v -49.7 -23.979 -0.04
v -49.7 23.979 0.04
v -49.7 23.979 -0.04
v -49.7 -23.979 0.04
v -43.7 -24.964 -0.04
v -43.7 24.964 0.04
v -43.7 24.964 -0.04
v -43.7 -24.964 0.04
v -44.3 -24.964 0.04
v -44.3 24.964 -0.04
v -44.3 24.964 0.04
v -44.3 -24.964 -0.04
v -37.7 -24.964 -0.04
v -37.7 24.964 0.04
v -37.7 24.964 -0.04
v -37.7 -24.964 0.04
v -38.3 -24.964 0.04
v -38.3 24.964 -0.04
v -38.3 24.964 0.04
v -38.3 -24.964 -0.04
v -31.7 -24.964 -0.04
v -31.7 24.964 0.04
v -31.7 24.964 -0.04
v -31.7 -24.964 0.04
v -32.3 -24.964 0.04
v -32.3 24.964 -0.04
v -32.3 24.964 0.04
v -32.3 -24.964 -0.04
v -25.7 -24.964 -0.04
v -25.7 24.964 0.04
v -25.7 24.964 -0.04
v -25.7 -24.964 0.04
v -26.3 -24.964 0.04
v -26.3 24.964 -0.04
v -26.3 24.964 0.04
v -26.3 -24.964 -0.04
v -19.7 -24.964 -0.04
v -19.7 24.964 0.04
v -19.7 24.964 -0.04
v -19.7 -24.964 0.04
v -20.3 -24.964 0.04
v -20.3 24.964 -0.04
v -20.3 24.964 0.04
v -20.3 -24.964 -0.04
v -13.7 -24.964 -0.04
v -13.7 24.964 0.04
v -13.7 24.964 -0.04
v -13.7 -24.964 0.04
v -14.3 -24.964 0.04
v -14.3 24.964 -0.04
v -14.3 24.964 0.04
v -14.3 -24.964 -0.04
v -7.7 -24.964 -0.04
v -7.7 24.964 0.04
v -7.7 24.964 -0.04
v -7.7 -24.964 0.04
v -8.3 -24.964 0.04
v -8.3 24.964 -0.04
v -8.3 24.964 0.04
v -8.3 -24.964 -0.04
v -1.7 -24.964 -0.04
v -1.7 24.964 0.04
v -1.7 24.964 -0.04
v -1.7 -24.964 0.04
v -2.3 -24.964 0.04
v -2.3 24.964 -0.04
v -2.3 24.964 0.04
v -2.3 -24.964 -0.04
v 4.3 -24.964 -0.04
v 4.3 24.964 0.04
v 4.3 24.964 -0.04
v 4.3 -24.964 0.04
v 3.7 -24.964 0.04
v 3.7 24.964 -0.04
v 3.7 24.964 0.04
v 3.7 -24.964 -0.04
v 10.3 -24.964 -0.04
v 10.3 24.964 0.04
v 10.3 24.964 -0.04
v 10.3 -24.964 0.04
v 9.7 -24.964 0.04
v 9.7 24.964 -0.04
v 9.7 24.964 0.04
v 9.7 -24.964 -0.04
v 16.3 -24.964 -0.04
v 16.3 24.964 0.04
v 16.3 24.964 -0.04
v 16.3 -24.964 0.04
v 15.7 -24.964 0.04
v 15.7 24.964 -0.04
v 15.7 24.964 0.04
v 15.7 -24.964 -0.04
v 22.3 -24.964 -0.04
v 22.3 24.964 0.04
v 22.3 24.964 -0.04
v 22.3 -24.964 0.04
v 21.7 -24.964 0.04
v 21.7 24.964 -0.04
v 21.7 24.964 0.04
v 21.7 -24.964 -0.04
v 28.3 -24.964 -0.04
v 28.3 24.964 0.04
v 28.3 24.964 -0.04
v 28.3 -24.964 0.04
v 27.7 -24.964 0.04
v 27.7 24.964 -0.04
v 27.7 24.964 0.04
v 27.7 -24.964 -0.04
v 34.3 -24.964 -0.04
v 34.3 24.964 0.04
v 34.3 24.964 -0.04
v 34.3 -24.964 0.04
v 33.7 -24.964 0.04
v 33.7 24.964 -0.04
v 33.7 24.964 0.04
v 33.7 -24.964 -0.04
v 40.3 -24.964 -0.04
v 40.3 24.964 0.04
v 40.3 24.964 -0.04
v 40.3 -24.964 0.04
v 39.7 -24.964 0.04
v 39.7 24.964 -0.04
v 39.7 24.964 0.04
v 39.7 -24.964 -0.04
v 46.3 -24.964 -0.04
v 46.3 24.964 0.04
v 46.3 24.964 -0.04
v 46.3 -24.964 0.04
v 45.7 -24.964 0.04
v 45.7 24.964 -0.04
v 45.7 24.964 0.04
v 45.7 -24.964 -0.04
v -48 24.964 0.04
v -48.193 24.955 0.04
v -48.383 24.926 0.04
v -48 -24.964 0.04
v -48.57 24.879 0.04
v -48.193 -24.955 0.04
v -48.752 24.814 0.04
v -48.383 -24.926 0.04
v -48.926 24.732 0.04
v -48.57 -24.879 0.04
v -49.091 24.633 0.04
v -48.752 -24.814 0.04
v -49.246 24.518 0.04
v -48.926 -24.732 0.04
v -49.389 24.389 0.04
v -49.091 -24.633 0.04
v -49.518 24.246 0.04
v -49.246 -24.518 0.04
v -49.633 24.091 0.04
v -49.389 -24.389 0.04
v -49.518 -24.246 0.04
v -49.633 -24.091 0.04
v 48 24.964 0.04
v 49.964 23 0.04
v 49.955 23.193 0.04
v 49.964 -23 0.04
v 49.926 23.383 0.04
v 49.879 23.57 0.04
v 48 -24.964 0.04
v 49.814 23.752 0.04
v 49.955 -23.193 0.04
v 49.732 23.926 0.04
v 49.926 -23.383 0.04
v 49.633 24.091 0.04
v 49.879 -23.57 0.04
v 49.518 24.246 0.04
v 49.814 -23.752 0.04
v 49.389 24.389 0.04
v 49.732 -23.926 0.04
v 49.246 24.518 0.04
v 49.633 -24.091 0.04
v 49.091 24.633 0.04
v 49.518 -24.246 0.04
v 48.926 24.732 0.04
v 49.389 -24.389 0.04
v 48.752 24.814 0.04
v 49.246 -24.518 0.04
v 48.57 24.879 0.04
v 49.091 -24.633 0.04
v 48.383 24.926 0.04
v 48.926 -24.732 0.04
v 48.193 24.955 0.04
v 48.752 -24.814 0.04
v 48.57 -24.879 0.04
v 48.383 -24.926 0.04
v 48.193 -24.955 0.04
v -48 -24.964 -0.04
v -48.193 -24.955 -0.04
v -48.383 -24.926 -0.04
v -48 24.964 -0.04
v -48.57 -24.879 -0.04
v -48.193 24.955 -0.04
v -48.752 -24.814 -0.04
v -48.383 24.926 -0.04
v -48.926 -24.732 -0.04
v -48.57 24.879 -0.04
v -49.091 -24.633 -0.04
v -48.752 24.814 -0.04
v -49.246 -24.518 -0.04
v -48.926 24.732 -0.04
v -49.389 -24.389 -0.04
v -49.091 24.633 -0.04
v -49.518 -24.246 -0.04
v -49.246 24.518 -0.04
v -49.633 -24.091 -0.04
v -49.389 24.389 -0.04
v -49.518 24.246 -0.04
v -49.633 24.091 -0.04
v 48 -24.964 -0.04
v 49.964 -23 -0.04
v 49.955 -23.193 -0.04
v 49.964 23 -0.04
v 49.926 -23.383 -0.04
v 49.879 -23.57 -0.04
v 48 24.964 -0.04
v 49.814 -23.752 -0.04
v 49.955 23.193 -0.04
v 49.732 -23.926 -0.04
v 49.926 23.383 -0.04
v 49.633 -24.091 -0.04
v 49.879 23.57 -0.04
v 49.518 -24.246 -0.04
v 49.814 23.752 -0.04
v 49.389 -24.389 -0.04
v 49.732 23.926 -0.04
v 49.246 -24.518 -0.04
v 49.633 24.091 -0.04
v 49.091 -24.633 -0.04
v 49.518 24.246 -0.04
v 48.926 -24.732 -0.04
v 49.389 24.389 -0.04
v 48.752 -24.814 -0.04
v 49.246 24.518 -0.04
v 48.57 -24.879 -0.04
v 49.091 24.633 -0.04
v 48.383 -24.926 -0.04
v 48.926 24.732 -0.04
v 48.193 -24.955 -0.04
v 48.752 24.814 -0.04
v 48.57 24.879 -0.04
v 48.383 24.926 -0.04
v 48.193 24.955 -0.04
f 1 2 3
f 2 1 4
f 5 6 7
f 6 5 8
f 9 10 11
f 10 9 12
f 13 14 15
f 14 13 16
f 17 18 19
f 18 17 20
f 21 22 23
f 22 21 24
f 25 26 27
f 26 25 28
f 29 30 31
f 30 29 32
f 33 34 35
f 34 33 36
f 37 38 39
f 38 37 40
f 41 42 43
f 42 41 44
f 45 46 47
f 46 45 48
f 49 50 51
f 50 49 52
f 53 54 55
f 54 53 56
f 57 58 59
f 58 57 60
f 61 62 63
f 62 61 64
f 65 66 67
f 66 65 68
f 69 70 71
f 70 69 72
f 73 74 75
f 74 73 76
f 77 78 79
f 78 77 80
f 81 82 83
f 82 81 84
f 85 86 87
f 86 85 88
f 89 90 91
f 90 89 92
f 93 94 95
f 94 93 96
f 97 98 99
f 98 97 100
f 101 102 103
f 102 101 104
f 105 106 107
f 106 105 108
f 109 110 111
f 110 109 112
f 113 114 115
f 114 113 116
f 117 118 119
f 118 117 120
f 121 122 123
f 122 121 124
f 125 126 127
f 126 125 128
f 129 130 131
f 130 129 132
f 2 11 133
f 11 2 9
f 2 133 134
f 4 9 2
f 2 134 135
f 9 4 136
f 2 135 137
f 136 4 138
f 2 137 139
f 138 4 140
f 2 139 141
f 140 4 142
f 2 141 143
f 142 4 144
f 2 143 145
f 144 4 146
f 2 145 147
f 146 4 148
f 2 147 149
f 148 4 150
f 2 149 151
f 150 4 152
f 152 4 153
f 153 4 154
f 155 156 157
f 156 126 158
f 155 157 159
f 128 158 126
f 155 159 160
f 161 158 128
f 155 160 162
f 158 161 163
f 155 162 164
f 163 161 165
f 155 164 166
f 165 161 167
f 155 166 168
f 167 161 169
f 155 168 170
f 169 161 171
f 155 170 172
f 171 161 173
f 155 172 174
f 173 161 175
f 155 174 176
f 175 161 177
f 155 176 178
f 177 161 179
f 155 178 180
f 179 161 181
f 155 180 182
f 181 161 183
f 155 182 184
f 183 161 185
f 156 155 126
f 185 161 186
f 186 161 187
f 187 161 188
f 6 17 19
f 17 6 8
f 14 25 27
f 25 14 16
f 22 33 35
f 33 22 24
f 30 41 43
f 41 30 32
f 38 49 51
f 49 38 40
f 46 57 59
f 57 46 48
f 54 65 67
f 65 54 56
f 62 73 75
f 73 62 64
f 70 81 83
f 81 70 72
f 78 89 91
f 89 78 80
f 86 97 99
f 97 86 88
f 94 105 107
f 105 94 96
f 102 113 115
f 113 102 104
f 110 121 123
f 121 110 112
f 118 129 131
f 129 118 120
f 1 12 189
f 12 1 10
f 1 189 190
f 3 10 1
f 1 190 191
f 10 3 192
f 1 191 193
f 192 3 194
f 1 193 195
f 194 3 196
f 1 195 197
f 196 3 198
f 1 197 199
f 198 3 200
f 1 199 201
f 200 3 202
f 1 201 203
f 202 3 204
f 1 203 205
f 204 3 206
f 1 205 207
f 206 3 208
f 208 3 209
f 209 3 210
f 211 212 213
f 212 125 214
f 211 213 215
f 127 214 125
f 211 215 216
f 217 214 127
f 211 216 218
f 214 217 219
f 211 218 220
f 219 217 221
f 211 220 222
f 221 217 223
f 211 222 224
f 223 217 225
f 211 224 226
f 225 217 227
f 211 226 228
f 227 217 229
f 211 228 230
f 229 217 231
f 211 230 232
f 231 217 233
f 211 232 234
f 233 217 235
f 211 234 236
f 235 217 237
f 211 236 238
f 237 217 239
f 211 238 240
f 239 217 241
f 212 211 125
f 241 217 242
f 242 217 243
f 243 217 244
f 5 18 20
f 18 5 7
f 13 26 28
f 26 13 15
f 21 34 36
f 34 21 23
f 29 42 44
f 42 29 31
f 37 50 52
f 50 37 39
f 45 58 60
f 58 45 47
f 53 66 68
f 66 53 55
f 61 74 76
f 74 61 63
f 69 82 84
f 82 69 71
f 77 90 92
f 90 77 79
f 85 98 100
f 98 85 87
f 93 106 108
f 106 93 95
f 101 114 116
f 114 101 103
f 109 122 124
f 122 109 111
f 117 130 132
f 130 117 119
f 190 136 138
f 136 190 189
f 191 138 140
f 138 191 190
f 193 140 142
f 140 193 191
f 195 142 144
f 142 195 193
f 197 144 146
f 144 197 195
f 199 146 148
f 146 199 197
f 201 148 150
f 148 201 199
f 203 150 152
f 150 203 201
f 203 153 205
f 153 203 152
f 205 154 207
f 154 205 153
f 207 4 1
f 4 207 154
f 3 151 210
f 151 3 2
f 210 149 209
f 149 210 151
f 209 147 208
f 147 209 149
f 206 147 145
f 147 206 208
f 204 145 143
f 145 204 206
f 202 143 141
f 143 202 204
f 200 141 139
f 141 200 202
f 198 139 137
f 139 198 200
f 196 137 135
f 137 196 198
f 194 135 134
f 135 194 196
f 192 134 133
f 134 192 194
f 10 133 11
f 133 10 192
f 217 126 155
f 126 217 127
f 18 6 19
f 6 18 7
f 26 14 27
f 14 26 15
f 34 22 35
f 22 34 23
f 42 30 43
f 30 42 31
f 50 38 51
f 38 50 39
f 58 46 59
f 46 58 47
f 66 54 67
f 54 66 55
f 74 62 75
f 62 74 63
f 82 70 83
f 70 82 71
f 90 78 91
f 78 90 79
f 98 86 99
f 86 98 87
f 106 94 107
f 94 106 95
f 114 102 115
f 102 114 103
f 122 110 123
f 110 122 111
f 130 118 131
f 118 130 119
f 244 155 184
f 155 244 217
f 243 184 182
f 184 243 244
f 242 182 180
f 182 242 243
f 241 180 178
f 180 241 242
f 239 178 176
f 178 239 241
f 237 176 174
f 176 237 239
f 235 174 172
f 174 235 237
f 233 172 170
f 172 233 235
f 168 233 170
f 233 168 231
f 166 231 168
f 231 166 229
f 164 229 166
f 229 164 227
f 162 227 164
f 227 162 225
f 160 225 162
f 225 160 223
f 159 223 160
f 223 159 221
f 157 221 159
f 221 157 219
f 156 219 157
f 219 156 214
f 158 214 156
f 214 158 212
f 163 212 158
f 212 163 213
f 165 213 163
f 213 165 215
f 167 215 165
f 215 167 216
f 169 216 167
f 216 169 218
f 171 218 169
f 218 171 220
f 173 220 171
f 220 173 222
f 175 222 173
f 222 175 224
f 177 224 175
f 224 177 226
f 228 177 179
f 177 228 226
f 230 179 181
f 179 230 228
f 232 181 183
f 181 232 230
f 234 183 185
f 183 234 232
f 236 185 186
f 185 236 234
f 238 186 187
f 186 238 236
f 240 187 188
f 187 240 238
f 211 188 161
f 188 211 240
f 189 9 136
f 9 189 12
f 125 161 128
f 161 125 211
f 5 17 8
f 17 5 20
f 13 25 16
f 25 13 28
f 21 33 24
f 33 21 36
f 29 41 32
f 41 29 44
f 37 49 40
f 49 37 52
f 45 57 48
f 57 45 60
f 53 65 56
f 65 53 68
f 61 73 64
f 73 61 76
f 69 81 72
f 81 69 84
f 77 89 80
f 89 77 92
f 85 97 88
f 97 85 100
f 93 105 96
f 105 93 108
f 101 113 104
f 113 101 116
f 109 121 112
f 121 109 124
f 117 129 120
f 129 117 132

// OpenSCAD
// Aluminium foil tape sheet (single connected solid, robust visibility)

// Parameters
tape_length = 100; //[50:200:1]
tape_width = 50; //[25:100:1]
tape_thickness = 0.08; //[0.04:0.16:0.01]
adhesive_ratio = 0.35; //[0.2:0.6:0.01]
corner_radius = 2; //[1:4:0.25]
edge_chamfer = 0.25; //[0.1:0.6:0.05]
texture_depth = 0.01; //[0.0:0.03:0.005]
texture_pitch = 6; //[3:12:1]
texture_groove_width = 0.6; //[0.3:1.2:0.1]
overlap = 0.5; //[0.2:2:0.1]

$fn = 64;

// Helpers
eps = 0.001;

// Keep geometry valid even for very thin tape
t  = max(tape_thickness, 0.02);
cr = min(corner_radius, min(tape_length, tape_width)/2 - eps);

// Chamfer/texture must never exceed thickness
ch = min(edge_chamfer, t*0.45);
td = min(texture_depth, t*0.35);

// 2D rounded rectangle
module rounded_rect_2d(L, W, R) {
  R2 = max(min(R, min(L, W)/2 - eps), 0);
  if (R2 <= eps) {
    square([L, W], center=true);
  } else {
    hull() {
      translate([ L/2 - R2,  W/2 - R2]) circle(r=R2);
      translate([-L/2 + R2,  W/2 - R2]) circle(r=R2);
      translate([-L/2 + R2, -W/2 + R2]) circle(r=R2);
      translate([ L/2 - R2, -W/2 + R2]) circle(r=R2);
    }
  }
}

// Main tape body with rounded corners
module tape_body() {
  linear_extrude(height=t, center=true, convexity=10)
    rounded_rect_2d(tape_length, tape_width, cr);
}

// Subtractive top chamfer (bevel) as a thin ring near the perimeter
module top_chamfer_cut() {
  if (ch > eps) {
    // Ensure inner profile remains valid
    inner_L = max(tape_length - 2*ch, eps);
    inner_W = max(tape_width  - 2*ch, eps);
    inner_R = max(cr - ch, 0);

    translate([0, 0, t/2 - ch/2])
      linear_extrude(height=ch + overlap, center=true, convexity=10)
        difference() {
          rounded_rect_2d(tape_length + 2*overlap, tape_width + 2*overlap, cr);
          rounded_rect_2d(inner_L, inner_W, inner_R);
        }
  }
}

// Subtractive surface grooves on the top face (kept shallow so sheet stays connected)
module surface_texture_cut() {
  if (td > eps && texture_pitch > eps && texture_groove_width > eps) {
    n = max(1, floor(tape_length/texture_pitch));
    for (i = [0:n]) {
      x = -tape_length/2 + i*texture_pitch;
      // Keep grooves inside the perimeter a bit to avoid edge artifacts
      translate([x, 0, t/2 - td/2])
        cube([texture_groove_width, tape_width - 2*eps, td + overlap], center=true);
    }
  }
}

// Final Output: one connected solid
difference() {
  tape_body();
  top_chamfer_cut();
  surface_texture_cut();
}
